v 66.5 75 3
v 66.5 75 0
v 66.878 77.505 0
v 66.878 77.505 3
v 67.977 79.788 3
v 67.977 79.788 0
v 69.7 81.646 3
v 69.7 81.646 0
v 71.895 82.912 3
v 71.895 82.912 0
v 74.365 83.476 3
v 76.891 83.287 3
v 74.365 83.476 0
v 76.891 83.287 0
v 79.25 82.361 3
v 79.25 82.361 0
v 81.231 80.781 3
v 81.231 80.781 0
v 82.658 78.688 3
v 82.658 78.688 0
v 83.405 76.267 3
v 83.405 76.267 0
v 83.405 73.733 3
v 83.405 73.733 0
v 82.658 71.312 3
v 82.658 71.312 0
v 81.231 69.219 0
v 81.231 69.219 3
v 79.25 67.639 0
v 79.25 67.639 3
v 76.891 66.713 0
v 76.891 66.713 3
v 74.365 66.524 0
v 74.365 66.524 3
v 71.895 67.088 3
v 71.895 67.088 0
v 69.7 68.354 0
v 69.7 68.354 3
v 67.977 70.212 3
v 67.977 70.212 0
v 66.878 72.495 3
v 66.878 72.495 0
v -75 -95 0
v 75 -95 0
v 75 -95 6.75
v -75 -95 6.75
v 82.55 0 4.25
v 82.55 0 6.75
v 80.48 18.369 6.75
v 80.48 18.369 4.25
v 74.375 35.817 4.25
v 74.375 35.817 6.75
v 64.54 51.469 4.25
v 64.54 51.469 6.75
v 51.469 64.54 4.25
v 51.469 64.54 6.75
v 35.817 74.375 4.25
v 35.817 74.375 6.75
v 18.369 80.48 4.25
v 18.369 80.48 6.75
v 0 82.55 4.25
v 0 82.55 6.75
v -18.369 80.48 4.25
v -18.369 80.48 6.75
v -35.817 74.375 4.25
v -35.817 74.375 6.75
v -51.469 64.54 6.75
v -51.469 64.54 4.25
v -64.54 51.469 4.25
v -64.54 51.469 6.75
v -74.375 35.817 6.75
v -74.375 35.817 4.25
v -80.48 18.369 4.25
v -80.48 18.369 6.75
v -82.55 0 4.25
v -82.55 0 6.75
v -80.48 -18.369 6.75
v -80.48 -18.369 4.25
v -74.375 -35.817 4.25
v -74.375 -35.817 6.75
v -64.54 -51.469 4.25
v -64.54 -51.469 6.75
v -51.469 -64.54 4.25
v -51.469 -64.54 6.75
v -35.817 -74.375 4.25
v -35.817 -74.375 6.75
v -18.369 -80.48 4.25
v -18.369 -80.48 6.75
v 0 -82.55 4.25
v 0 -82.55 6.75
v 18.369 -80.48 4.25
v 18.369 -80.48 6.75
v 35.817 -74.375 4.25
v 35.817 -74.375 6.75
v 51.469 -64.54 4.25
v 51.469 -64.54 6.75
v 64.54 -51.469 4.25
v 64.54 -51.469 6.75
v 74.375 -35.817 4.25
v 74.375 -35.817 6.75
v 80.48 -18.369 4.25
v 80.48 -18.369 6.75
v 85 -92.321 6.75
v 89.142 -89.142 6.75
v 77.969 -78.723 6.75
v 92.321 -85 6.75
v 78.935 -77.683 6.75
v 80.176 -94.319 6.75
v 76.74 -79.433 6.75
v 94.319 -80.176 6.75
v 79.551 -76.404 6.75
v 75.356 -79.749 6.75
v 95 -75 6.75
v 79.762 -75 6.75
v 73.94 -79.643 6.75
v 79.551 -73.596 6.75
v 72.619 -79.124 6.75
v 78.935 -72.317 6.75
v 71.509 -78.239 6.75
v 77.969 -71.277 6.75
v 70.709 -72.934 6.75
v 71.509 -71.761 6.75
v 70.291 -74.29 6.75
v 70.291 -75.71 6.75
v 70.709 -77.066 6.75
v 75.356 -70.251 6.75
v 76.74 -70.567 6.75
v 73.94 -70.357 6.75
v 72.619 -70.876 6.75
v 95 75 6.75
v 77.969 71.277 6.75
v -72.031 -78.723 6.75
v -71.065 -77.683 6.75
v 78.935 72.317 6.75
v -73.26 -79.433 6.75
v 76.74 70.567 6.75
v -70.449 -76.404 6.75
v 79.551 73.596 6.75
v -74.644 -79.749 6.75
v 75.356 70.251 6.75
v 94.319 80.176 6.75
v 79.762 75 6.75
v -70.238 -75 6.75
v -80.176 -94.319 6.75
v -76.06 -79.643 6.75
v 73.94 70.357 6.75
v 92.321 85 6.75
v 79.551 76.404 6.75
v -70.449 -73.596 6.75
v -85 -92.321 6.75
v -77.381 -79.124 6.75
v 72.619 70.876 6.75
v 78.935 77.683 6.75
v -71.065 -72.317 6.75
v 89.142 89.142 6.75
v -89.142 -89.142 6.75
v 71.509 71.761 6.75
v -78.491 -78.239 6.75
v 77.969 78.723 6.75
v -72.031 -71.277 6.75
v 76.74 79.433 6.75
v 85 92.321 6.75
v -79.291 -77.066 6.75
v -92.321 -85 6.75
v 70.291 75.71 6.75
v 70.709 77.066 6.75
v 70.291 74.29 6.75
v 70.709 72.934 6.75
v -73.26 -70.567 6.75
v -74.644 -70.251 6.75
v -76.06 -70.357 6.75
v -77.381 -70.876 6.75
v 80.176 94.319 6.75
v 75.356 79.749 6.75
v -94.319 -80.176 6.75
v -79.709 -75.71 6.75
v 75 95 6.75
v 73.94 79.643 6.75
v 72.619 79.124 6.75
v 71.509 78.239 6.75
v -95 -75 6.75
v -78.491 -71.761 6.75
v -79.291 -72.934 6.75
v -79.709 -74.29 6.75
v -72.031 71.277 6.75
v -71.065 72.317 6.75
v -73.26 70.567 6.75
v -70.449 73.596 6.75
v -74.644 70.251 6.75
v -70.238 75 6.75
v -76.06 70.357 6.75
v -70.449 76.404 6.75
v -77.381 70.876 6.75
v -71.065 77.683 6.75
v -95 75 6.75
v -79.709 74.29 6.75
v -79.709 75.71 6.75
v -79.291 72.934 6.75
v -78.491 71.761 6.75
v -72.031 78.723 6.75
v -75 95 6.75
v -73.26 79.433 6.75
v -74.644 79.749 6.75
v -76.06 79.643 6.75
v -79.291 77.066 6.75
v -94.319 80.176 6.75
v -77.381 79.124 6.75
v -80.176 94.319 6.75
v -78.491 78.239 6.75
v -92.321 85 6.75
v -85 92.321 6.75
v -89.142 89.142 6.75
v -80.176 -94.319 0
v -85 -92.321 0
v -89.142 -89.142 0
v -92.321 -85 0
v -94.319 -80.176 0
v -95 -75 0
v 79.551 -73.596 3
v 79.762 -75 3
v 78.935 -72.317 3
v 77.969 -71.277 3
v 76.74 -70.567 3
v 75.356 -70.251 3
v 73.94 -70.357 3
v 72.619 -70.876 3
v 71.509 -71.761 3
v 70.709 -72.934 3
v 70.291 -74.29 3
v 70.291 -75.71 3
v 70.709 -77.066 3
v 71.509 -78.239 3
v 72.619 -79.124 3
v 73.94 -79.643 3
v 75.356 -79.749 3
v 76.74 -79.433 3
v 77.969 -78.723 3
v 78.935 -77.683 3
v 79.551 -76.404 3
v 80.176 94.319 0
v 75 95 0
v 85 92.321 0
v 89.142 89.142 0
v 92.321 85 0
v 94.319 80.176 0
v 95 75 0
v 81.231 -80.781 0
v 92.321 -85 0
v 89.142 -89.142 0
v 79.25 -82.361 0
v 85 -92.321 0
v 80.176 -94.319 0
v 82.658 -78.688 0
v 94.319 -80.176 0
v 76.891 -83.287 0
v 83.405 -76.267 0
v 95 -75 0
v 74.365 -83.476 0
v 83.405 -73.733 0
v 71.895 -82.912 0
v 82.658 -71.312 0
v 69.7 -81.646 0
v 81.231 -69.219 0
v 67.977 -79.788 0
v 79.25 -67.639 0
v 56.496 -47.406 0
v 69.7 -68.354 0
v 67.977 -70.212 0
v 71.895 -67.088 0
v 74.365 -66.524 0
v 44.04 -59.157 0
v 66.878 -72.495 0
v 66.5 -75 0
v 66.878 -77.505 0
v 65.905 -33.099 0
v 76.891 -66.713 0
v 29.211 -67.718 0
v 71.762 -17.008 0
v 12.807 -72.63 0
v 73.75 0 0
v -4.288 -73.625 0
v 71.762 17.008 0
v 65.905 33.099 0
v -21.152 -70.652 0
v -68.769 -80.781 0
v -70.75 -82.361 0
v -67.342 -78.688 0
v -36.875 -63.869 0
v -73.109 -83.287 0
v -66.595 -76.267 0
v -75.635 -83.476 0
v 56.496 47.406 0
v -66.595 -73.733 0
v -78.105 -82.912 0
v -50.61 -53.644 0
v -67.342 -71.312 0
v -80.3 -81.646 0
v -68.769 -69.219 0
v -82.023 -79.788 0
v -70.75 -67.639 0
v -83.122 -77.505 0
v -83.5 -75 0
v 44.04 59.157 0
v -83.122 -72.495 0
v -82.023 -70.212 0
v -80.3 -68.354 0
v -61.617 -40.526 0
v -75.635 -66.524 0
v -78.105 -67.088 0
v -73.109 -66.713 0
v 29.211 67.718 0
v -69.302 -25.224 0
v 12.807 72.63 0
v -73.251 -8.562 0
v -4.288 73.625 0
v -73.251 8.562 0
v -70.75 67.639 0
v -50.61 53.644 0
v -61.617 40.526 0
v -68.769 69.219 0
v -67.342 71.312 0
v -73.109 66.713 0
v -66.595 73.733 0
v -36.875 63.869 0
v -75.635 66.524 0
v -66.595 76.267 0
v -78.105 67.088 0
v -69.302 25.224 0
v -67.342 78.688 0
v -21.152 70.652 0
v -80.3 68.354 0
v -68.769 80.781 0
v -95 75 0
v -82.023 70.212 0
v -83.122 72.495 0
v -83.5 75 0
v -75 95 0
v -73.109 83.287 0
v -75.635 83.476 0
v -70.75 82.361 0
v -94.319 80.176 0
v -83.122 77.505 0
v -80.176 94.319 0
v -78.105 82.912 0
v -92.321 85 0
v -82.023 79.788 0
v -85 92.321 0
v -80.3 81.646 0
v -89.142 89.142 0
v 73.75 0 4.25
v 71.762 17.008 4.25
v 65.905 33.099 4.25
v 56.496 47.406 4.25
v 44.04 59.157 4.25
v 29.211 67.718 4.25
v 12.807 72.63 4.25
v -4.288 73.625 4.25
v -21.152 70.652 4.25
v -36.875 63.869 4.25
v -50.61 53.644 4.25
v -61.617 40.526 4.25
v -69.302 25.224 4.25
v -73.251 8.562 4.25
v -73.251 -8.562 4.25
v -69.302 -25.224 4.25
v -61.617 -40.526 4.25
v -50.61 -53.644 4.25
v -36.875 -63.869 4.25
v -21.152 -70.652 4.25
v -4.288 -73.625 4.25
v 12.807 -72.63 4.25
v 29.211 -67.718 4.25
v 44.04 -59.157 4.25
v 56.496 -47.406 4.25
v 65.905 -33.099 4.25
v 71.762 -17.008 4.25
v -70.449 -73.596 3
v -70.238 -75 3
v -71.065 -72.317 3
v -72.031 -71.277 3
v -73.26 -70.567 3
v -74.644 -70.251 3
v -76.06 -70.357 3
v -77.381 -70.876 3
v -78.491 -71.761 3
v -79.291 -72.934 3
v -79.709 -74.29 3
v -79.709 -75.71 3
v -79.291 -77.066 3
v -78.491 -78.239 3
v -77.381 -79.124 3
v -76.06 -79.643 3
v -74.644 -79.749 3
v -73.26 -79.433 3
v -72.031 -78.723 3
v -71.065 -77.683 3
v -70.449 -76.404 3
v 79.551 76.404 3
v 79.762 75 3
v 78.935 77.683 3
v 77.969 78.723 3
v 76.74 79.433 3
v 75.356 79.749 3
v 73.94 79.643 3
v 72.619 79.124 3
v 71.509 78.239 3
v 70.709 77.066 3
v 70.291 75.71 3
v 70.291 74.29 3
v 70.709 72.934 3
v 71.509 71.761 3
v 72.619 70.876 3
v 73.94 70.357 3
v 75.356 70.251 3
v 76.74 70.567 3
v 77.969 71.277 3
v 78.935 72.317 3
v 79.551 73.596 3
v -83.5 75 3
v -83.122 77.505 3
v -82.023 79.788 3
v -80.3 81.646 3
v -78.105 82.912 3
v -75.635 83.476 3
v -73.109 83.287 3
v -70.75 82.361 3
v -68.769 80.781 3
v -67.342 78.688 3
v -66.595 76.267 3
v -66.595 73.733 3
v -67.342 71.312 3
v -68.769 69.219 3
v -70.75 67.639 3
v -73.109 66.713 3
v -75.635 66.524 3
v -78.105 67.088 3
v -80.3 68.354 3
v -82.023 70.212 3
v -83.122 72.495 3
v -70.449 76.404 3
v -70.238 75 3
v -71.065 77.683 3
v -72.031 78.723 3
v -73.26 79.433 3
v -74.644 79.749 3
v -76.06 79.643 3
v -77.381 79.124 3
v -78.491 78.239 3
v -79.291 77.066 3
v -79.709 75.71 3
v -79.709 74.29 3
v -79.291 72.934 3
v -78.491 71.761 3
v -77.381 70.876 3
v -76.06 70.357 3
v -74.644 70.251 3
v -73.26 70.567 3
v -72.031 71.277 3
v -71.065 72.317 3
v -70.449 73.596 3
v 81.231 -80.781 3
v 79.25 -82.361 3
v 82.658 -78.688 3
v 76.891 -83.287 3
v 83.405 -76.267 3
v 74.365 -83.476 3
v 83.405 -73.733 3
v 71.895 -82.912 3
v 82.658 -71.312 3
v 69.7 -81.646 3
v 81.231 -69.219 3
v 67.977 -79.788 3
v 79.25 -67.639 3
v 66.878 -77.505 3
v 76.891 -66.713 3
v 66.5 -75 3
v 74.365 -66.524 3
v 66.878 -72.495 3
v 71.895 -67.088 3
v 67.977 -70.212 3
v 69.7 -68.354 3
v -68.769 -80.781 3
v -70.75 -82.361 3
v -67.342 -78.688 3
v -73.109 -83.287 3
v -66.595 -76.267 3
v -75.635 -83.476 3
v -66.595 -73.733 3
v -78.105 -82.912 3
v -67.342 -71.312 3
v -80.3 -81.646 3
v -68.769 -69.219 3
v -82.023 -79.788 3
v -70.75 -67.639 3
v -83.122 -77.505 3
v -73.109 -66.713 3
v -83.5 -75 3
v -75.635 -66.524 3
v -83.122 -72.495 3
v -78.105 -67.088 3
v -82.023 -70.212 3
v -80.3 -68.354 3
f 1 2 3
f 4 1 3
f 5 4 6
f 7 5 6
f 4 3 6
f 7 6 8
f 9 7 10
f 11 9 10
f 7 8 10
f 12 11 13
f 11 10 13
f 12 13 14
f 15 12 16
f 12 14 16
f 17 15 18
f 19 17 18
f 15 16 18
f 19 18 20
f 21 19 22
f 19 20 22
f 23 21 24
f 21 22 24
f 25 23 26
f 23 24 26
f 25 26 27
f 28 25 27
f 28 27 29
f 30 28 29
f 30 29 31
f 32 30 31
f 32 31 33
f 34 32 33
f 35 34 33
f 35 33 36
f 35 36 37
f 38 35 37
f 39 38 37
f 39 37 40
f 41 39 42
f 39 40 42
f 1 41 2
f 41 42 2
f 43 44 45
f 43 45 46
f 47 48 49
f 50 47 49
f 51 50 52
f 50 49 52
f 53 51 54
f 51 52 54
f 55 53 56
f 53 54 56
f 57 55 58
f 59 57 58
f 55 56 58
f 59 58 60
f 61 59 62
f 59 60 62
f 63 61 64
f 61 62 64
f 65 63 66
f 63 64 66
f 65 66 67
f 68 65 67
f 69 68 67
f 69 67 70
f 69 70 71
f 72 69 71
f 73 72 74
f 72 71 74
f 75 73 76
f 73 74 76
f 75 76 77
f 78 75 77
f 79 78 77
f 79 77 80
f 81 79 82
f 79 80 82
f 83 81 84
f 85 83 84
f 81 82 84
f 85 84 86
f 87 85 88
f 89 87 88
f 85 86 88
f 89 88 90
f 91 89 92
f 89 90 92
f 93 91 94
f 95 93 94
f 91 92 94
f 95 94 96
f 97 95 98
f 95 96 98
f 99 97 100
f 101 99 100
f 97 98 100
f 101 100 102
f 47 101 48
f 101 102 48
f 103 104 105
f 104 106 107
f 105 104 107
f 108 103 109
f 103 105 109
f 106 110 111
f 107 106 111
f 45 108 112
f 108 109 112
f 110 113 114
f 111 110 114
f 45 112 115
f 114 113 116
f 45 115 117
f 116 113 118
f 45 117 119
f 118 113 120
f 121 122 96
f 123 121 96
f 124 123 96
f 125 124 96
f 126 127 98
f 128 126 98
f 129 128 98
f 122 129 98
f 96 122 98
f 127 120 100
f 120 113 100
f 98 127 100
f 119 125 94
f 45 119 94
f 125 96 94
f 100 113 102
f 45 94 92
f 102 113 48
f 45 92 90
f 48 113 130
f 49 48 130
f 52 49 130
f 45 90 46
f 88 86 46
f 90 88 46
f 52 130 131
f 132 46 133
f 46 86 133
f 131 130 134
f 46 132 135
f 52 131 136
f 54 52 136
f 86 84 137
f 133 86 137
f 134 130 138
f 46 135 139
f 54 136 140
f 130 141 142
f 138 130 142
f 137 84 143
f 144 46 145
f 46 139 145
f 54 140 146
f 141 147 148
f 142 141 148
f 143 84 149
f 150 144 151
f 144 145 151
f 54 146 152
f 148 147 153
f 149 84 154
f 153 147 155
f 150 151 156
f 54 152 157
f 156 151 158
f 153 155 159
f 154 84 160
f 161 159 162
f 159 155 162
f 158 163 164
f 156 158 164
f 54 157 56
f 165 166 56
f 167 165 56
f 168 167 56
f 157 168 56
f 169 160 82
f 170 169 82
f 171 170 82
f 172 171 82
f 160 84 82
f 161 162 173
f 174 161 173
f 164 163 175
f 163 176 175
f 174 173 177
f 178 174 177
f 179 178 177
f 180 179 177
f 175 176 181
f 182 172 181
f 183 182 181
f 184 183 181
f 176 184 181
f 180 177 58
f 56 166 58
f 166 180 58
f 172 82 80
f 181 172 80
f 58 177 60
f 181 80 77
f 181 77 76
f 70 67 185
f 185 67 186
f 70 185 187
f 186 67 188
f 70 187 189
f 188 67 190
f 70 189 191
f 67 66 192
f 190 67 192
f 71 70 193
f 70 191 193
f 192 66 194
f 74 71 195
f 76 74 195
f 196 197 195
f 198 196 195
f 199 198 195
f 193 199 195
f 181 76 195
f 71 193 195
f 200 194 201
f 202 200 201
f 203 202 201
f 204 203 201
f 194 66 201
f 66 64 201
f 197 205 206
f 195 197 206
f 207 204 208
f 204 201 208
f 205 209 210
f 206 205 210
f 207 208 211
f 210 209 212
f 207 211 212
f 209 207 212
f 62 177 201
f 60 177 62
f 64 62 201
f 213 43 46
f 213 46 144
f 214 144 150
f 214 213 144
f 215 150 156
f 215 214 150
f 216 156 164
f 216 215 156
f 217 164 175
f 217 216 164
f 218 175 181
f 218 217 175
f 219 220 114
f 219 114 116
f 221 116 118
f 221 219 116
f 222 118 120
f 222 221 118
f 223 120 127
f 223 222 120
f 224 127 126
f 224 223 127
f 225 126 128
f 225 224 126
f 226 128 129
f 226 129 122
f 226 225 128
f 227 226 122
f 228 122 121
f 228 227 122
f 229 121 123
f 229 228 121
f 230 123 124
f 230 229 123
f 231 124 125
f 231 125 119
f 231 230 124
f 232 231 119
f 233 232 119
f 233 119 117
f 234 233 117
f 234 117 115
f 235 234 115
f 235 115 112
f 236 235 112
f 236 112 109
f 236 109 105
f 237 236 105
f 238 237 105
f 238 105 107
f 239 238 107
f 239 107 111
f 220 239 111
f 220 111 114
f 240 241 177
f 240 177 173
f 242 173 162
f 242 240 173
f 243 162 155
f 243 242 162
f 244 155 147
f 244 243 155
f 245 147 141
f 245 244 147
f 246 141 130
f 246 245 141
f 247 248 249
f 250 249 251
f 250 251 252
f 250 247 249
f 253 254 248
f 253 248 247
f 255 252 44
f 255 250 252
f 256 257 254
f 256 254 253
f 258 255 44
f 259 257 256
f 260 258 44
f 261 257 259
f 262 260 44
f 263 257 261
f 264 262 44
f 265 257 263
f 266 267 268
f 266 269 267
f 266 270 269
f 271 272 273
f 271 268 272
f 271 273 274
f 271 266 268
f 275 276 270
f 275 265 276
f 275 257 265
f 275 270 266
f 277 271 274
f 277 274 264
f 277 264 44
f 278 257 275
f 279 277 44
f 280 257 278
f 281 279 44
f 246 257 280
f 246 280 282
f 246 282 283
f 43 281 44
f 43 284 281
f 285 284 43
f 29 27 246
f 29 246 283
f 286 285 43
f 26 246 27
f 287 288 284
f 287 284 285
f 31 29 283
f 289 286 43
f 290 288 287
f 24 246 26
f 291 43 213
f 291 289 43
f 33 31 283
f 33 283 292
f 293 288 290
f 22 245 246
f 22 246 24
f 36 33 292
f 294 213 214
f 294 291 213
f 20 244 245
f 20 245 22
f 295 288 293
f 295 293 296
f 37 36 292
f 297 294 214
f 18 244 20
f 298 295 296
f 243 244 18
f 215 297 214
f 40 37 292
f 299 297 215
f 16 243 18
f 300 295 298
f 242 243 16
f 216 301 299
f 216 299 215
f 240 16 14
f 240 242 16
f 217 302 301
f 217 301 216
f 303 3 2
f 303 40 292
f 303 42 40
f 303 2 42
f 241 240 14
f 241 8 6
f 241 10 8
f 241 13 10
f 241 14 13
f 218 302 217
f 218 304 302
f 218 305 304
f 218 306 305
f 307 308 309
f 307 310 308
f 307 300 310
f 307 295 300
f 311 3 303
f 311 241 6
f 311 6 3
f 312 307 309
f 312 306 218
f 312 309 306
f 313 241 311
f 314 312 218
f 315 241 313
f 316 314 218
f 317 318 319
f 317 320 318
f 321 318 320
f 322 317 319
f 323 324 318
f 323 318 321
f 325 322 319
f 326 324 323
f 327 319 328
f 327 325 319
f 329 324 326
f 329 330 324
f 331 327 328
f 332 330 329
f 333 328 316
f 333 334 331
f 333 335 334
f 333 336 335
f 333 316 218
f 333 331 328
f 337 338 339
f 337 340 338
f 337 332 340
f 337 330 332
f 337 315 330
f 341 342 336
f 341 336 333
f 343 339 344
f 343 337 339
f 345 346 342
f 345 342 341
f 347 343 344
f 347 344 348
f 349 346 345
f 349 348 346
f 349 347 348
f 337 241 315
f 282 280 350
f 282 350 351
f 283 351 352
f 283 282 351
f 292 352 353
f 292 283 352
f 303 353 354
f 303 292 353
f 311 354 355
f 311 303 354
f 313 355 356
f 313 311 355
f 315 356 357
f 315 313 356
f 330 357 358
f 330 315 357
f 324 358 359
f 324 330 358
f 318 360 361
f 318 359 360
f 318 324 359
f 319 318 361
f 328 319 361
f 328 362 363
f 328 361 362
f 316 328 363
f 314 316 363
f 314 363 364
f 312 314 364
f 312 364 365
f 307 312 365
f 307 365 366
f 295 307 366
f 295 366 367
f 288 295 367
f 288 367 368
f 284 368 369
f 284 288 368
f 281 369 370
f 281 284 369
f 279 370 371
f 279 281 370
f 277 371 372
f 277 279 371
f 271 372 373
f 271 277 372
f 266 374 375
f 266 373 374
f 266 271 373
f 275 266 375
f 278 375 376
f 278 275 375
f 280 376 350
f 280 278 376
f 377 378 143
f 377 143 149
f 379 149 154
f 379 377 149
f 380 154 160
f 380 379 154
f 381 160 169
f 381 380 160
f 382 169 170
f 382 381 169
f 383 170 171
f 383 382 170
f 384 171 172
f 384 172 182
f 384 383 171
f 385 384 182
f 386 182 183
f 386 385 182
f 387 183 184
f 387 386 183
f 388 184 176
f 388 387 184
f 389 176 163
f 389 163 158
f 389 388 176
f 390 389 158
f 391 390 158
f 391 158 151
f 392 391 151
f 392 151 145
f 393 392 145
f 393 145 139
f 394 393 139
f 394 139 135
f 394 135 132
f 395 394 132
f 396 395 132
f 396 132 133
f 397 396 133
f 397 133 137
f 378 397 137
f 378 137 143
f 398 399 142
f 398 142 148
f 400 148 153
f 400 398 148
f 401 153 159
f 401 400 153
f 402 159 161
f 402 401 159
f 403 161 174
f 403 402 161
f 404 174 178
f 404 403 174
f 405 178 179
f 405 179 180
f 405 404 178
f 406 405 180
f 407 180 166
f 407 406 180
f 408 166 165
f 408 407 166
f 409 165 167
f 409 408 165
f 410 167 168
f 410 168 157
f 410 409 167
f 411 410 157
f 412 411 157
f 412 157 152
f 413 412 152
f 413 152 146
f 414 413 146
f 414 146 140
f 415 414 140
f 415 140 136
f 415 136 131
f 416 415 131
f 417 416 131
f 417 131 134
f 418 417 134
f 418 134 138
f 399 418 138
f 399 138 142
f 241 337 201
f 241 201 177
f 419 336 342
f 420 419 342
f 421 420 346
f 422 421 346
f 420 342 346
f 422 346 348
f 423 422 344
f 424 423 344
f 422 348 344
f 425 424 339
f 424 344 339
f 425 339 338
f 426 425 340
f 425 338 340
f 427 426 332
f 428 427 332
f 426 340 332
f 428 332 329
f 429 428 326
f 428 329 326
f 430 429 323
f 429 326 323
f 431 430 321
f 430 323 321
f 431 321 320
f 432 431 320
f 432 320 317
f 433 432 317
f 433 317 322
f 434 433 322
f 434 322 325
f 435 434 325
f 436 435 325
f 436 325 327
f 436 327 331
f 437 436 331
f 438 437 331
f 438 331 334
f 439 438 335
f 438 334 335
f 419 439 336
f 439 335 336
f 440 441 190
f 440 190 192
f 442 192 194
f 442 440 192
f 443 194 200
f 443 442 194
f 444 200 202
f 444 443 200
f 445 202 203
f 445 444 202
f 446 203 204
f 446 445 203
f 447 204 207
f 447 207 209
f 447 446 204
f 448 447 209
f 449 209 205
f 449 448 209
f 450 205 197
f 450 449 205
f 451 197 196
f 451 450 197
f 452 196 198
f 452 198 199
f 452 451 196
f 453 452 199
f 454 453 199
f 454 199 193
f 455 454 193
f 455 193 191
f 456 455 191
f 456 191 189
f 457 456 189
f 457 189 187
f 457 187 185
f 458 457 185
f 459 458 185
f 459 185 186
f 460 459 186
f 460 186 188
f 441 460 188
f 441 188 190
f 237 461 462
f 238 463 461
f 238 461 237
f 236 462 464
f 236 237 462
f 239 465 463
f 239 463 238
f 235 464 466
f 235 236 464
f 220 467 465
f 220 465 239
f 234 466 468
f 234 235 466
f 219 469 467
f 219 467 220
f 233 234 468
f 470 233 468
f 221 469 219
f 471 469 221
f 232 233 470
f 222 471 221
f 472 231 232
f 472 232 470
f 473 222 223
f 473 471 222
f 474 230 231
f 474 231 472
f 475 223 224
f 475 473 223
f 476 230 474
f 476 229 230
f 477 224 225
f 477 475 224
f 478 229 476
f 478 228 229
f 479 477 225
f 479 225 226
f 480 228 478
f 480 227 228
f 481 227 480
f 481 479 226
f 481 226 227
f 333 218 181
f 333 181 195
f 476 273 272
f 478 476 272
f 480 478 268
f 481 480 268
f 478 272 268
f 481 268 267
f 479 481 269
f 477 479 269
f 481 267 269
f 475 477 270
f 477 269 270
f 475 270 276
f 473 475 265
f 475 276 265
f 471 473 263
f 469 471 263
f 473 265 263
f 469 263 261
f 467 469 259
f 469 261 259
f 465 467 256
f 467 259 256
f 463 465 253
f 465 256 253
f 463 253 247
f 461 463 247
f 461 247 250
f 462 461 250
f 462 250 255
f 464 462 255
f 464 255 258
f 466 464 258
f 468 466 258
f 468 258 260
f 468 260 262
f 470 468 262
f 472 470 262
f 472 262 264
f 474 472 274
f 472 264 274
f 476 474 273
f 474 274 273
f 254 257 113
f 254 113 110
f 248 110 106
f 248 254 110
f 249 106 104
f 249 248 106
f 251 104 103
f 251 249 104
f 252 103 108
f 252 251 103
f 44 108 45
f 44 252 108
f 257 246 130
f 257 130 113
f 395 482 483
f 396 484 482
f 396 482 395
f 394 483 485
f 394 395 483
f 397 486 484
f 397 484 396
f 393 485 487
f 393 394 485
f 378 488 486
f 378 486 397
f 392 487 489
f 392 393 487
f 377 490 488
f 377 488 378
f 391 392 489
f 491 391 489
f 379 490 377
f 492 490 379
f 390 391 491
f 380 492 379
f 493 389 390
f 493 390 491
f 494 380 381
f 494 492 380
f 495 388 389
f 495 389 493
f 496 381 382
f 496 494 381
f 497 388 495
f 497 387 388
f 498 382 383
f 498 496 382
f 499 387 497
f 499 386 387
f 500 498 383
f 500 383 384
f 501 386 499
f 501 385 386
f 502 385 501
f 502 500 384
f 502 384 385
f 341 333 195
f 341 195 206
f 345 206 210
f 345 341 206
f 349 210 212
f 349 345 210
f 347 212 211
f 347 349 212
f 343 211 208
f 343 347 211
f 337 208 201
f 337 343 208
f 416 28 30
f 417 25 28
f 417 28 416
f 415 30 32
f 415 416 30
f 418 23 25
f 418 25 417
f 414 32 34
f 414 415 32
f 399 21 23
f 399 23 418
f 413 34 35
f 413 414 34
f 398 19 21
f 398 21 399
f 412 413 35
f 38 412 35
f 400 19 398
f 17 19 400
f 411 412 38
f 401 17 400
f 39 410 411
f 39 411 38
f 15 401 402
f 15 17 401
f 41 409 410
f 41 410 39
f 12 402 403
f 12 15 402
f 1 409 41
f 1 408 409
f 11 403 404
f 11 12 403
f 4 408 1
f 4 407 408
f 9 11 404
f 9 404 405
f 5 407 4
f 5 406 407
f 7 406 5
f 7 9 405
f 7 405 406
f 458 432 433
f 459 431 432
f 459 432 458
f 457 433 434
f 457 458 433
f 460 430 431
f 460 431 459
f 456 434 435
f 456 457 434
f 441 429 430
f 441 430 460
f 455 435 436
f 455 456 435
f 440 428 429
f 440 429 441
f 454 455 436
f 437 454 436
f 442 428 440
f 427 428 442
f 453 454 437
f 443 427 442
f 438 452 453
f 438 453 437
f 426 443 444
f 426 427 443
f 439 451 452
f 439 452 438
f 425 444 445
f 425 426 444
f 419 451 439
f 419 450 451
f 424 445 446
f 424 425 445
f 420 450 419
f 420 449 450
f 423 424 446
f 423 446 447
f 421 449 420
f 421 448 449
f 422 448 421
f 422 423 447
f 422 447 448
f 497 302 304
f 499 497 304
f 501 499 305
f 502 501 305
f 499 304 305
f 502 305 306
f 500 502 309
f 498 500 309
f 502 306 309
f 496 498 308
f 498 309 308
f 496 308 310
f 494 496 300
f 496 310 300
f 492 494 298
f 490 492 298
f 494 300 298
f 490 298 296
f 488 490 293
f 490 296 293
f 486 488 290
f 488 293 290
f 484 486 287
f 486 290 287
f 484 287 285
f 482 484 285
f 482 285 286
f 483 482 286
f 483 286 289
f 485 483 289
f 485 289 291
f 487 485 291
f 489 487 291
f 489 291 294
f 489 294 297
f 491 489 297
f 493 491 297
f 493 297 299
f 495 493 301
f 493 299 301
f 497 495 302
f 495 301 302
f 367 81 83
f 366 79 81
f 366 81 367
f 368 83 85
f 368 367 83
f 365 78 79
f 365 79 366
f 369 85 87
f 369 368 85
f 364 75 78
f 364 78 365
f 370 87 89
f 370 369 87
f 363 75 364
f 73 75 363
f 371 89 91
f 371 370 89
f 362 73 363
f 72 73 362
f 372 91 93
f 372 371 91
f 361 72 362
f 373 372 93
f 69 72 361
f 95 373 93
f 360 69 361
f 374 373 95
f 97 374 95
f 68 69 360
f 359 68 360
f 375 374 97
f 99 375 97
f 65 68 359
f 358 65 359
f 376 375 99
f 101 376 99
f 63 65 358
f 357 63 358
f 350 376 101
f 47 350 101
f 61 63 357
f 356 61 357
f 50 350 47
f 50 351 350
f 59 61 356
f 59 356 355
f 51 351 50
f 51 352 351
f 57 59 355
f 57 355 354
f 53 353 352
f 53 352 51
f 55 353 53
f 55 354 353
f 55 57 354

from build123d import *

# Parameters (mm, degrees)
SKETCH1_R           = 73.75
SKETCH1_R_2         = 4.7625
BOSS_EXTRUDE1_DEPTH = 6.75
SKETCH2_R           = 8.5
CUT_EXTRUDE1_DEPTH  = 3
SKETCH3_R           = 82.55
CUT_EXTRUDE2_DEPTH  = 2.5


with BuildPart() as part:
    # Sketch1 → Boss-Extrude1 (new body)
    with BuildSketch(Plane.XY):
        with BuildLine():
            Line((75, -95), (-75, -95))
            ThreePointArc((-75, -95), (-89.142135624, -89.142135624), (-95, -75))
            Line((-95, -75), (-95, 75))
            ThreePointArc((-95, 75), (-89.142135624, 89.142135624), (-75, 95))
            Line((-75, 95), (75, 95))
            ThreePointArc((75, 95), (89.142135624, 89.142135624), (95, 75))
            Line((95, 75), (95, -75))
            ThreePointArc((95, -75), (89.142135624, -89.142135624), (75, -95))
        make_face()
        Circle(SKETCH1_R, mode=Mode.SUBTRACT)
        with Locations((-75, 75)):
            Circle(SKETCH1_R_2, mode=Mode.SUBTRACT)
        with Locations((75, 75)):
            Circle(SKETCH1_R_2, mode=Mode.SUBTRACT)
        with Locations((75, -75)):
            Circle(SKETCH1_R_2, mode=Mode.SUBTRACT)
        with Locations((-75, -75)):
            Circle(SKETCH1_R_2, mode=Mode.SUBTRACT)
    extrude(amount=BOSS_EXTRUDE1_DEPTH)

    # Sketch2 → Cut-Extrude1 (cut)
    with BuildSketch(Plane(origin=(0, 0, 0), x_dir=(-1, 0, 0), z_dir=(0, 0, -1))):
        with Locations((-75, 75)):
            Circle(SKETCH2_R)
        with Locations((75, 75)):
            Circle(SKETCH2_R)
        with Locations((75, -75)):
            Circle(SKETCH2_R)
        with Locations((-75, -75)):
            Circle(SKETCH2_R)
    extrude(amount=-CUT_EXTRUDE1_DEPTH, mode=Mode.SUBTRACT)

    # Sketch3 → Cut-Extrude2 (cut)
    with BuildSketch(Plane.XY.offset(6.75)):
        Circle(SKETCH3_R)
    extrude(amount=-CUT_EXTRUDE2_DEPTH, mode=Mode.SUBTRACT)


solid = part.part
